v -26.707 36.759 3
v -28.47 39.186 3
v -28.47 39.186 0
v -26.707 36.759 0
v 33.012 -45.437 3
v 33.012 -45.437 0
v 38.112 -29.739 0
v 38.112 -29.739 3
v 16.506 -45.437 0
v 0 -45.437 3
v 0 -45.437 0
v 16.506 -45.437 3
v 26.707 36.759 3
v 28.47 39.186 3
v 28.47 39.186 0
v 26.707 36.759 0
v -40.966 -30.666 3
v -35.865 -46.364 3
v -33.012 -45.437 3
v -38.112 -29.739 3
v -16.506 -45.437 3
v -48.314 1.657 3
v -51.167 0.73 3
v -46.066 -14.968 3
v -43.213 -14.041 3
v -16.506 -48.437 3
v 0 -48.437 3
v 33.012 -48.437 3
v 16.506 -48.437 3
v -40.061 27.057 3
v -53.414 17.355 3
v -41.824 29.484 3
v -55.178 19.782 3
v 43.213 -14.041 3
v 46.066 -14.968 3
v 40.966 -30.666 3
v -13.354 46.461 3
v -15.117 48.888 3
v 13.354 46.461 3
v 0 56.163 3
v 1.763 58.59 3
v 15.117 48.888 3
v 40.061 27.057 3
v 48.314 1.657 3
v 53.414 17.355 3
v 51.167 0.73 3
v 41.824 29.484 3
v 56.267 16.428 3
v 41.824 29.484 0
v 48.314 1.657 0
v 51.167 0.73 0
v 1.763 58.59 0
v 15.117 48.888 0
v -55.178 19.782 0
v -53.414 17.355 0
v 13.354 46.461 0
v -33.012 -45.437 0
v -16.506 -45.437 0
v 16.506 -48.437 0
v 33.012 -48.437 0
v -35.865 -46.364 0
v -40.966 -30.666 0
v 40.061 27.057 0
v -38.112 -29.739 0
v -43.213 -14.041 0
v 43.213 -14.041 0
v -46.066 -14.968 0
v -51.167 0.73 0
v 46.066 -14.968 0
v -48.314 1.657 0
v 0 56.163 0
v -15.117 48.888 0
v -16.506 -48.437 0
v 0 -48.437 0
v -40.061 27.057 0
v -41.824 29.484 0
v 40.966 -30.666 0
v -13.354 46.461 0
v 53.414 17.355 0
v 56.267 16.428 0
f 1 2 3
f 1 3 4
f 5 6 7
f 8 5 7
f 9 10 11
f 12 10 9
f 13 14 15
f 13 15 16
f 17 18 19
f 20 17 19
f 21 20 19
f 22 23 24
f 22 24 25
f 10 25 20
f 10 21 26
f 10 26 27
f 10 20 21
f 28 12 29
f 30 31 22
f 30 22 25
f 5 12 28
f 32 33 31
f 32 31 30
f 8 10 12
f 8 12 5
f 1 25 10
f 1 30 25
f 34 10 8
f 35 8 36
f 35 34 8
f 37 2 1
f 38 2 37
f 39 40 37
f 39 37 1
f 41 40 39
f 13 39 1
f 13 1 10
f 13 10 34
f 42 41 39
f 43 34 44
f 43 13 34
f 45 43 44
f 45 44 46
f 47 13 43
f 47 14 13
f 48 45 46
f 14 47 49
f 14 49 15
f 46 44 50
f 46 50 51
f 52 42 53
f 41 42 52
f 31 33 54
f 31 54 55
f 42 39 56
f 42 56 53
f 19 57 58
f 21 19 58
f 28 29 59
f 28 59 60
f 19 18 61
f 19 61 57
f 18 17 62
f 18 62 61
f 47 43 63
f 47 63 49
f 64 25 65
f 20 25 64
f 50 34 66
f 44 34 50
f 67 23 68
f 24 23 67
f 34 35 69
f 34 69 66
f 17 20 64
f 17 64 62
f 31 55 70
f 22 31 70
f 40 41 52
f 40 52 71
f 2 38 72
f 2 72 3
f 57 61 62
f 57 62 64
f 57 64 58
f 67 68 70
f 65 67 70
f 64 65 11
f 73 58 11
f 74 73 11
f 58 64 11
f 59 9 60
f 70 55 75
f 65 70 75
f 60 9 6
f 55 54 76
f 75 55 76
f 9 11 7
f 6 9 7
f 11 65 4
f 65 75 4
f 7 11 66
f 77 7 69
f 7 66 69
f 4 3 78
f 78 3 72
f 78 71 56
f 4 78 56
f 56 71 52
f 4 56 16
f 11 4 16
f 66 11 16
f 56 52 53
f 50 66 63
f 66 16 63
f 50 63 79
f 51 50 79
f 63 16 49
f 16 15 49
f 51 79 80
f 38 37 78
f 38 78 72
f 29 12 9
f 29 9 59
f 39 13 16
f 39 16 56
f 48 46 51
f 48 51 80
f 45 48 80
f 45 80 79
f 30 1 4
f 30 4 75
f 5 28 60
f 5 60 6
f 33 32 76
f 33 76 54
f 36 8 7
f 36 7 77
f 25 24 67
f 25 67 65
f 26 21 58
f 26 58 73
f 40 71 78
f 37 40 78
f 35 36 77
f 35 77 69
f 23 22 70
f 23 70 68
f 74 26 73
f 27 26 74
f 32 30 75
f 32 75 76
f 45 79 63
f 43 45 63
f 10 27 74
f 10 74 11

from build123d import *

# Parameters (mm, degrees)
F2_DEPTH = 3
F4_DEPTH = 3


with BuildPart() as f2:
    # F0 (on Top) → F2 (new body)
    with BuildSketch(Plane.XY):
        Polygon((53.4142809913, 17.3553519542), (0, 56.1630986972), (-53.4142809913, 17.3553519542), (-33.0118411373, -45.4369013028), (33.0118411373, -45.4369013028), align=None)
    extrude(amount=F2_DEPTH)

    # F3 (on face) → F4 (join)
    with BuildSketch(Plane.XY.offset(3)):
        Polygon((15.1169260047, 48.8882129946), (1.7633557569, 58.5901496803), (0, 56.1630986972), (-13.3535702478, 46.4611620115), (-15.1169260047, 48.8882129946), (-28.4704962525, 39.1862763088), (-26.7071404957, 36.7592253257), (-40.0607107435, 27.0572886399), (-41.8240665004, 29.4843396231), (-55.1776367482, 19.7824029373), (-53.4142809913, 17.3553519542), (-48.3136710278, 1.6572886399), (-51.1668405767, 0.7302376568), (-46.0662306132, -14.9678256574), (-43.2130610643, -14.0407746743), (-38.1124511008, -29.7388379885), (-40.9656206497, -30.6658889717), (-35.8650106861, -46.3639522859), (-33.0118411373, -45.4369013028), (-16.5059205686, -45.4369013028), (-16.5059205686, -48.4369013028), (0, -48.4369013028), (0, -45.4369013028), (16.5059205686, -45.4369013028), (16.5059205686, -48.4369013028), (33.0118411373, -48.4369013028), (33.0118411373, -45.4369013028), (38.1124511008, -29.7388379885), (40.9656206497, -30.6658889717), (46.0662306132, -14.9678256574), (43.2130610643, -14.0407746743), (48.3136710278, 1.6572886399), (51.1668405767, 0.7302376568), (56.2674505402, 16.4283009711), (53.4142809913, 17.3553519542), (40.0607107435, 27.0572886399), (41.8240665004, 29.4843396231), (28.4704962525, 39.1862763088), (26.7071404957, 36.7592253257), (13.3535702478, 46.4611620115), align=None)
    extrude(amount=-F4_DEPTH)


solid = f2.part
